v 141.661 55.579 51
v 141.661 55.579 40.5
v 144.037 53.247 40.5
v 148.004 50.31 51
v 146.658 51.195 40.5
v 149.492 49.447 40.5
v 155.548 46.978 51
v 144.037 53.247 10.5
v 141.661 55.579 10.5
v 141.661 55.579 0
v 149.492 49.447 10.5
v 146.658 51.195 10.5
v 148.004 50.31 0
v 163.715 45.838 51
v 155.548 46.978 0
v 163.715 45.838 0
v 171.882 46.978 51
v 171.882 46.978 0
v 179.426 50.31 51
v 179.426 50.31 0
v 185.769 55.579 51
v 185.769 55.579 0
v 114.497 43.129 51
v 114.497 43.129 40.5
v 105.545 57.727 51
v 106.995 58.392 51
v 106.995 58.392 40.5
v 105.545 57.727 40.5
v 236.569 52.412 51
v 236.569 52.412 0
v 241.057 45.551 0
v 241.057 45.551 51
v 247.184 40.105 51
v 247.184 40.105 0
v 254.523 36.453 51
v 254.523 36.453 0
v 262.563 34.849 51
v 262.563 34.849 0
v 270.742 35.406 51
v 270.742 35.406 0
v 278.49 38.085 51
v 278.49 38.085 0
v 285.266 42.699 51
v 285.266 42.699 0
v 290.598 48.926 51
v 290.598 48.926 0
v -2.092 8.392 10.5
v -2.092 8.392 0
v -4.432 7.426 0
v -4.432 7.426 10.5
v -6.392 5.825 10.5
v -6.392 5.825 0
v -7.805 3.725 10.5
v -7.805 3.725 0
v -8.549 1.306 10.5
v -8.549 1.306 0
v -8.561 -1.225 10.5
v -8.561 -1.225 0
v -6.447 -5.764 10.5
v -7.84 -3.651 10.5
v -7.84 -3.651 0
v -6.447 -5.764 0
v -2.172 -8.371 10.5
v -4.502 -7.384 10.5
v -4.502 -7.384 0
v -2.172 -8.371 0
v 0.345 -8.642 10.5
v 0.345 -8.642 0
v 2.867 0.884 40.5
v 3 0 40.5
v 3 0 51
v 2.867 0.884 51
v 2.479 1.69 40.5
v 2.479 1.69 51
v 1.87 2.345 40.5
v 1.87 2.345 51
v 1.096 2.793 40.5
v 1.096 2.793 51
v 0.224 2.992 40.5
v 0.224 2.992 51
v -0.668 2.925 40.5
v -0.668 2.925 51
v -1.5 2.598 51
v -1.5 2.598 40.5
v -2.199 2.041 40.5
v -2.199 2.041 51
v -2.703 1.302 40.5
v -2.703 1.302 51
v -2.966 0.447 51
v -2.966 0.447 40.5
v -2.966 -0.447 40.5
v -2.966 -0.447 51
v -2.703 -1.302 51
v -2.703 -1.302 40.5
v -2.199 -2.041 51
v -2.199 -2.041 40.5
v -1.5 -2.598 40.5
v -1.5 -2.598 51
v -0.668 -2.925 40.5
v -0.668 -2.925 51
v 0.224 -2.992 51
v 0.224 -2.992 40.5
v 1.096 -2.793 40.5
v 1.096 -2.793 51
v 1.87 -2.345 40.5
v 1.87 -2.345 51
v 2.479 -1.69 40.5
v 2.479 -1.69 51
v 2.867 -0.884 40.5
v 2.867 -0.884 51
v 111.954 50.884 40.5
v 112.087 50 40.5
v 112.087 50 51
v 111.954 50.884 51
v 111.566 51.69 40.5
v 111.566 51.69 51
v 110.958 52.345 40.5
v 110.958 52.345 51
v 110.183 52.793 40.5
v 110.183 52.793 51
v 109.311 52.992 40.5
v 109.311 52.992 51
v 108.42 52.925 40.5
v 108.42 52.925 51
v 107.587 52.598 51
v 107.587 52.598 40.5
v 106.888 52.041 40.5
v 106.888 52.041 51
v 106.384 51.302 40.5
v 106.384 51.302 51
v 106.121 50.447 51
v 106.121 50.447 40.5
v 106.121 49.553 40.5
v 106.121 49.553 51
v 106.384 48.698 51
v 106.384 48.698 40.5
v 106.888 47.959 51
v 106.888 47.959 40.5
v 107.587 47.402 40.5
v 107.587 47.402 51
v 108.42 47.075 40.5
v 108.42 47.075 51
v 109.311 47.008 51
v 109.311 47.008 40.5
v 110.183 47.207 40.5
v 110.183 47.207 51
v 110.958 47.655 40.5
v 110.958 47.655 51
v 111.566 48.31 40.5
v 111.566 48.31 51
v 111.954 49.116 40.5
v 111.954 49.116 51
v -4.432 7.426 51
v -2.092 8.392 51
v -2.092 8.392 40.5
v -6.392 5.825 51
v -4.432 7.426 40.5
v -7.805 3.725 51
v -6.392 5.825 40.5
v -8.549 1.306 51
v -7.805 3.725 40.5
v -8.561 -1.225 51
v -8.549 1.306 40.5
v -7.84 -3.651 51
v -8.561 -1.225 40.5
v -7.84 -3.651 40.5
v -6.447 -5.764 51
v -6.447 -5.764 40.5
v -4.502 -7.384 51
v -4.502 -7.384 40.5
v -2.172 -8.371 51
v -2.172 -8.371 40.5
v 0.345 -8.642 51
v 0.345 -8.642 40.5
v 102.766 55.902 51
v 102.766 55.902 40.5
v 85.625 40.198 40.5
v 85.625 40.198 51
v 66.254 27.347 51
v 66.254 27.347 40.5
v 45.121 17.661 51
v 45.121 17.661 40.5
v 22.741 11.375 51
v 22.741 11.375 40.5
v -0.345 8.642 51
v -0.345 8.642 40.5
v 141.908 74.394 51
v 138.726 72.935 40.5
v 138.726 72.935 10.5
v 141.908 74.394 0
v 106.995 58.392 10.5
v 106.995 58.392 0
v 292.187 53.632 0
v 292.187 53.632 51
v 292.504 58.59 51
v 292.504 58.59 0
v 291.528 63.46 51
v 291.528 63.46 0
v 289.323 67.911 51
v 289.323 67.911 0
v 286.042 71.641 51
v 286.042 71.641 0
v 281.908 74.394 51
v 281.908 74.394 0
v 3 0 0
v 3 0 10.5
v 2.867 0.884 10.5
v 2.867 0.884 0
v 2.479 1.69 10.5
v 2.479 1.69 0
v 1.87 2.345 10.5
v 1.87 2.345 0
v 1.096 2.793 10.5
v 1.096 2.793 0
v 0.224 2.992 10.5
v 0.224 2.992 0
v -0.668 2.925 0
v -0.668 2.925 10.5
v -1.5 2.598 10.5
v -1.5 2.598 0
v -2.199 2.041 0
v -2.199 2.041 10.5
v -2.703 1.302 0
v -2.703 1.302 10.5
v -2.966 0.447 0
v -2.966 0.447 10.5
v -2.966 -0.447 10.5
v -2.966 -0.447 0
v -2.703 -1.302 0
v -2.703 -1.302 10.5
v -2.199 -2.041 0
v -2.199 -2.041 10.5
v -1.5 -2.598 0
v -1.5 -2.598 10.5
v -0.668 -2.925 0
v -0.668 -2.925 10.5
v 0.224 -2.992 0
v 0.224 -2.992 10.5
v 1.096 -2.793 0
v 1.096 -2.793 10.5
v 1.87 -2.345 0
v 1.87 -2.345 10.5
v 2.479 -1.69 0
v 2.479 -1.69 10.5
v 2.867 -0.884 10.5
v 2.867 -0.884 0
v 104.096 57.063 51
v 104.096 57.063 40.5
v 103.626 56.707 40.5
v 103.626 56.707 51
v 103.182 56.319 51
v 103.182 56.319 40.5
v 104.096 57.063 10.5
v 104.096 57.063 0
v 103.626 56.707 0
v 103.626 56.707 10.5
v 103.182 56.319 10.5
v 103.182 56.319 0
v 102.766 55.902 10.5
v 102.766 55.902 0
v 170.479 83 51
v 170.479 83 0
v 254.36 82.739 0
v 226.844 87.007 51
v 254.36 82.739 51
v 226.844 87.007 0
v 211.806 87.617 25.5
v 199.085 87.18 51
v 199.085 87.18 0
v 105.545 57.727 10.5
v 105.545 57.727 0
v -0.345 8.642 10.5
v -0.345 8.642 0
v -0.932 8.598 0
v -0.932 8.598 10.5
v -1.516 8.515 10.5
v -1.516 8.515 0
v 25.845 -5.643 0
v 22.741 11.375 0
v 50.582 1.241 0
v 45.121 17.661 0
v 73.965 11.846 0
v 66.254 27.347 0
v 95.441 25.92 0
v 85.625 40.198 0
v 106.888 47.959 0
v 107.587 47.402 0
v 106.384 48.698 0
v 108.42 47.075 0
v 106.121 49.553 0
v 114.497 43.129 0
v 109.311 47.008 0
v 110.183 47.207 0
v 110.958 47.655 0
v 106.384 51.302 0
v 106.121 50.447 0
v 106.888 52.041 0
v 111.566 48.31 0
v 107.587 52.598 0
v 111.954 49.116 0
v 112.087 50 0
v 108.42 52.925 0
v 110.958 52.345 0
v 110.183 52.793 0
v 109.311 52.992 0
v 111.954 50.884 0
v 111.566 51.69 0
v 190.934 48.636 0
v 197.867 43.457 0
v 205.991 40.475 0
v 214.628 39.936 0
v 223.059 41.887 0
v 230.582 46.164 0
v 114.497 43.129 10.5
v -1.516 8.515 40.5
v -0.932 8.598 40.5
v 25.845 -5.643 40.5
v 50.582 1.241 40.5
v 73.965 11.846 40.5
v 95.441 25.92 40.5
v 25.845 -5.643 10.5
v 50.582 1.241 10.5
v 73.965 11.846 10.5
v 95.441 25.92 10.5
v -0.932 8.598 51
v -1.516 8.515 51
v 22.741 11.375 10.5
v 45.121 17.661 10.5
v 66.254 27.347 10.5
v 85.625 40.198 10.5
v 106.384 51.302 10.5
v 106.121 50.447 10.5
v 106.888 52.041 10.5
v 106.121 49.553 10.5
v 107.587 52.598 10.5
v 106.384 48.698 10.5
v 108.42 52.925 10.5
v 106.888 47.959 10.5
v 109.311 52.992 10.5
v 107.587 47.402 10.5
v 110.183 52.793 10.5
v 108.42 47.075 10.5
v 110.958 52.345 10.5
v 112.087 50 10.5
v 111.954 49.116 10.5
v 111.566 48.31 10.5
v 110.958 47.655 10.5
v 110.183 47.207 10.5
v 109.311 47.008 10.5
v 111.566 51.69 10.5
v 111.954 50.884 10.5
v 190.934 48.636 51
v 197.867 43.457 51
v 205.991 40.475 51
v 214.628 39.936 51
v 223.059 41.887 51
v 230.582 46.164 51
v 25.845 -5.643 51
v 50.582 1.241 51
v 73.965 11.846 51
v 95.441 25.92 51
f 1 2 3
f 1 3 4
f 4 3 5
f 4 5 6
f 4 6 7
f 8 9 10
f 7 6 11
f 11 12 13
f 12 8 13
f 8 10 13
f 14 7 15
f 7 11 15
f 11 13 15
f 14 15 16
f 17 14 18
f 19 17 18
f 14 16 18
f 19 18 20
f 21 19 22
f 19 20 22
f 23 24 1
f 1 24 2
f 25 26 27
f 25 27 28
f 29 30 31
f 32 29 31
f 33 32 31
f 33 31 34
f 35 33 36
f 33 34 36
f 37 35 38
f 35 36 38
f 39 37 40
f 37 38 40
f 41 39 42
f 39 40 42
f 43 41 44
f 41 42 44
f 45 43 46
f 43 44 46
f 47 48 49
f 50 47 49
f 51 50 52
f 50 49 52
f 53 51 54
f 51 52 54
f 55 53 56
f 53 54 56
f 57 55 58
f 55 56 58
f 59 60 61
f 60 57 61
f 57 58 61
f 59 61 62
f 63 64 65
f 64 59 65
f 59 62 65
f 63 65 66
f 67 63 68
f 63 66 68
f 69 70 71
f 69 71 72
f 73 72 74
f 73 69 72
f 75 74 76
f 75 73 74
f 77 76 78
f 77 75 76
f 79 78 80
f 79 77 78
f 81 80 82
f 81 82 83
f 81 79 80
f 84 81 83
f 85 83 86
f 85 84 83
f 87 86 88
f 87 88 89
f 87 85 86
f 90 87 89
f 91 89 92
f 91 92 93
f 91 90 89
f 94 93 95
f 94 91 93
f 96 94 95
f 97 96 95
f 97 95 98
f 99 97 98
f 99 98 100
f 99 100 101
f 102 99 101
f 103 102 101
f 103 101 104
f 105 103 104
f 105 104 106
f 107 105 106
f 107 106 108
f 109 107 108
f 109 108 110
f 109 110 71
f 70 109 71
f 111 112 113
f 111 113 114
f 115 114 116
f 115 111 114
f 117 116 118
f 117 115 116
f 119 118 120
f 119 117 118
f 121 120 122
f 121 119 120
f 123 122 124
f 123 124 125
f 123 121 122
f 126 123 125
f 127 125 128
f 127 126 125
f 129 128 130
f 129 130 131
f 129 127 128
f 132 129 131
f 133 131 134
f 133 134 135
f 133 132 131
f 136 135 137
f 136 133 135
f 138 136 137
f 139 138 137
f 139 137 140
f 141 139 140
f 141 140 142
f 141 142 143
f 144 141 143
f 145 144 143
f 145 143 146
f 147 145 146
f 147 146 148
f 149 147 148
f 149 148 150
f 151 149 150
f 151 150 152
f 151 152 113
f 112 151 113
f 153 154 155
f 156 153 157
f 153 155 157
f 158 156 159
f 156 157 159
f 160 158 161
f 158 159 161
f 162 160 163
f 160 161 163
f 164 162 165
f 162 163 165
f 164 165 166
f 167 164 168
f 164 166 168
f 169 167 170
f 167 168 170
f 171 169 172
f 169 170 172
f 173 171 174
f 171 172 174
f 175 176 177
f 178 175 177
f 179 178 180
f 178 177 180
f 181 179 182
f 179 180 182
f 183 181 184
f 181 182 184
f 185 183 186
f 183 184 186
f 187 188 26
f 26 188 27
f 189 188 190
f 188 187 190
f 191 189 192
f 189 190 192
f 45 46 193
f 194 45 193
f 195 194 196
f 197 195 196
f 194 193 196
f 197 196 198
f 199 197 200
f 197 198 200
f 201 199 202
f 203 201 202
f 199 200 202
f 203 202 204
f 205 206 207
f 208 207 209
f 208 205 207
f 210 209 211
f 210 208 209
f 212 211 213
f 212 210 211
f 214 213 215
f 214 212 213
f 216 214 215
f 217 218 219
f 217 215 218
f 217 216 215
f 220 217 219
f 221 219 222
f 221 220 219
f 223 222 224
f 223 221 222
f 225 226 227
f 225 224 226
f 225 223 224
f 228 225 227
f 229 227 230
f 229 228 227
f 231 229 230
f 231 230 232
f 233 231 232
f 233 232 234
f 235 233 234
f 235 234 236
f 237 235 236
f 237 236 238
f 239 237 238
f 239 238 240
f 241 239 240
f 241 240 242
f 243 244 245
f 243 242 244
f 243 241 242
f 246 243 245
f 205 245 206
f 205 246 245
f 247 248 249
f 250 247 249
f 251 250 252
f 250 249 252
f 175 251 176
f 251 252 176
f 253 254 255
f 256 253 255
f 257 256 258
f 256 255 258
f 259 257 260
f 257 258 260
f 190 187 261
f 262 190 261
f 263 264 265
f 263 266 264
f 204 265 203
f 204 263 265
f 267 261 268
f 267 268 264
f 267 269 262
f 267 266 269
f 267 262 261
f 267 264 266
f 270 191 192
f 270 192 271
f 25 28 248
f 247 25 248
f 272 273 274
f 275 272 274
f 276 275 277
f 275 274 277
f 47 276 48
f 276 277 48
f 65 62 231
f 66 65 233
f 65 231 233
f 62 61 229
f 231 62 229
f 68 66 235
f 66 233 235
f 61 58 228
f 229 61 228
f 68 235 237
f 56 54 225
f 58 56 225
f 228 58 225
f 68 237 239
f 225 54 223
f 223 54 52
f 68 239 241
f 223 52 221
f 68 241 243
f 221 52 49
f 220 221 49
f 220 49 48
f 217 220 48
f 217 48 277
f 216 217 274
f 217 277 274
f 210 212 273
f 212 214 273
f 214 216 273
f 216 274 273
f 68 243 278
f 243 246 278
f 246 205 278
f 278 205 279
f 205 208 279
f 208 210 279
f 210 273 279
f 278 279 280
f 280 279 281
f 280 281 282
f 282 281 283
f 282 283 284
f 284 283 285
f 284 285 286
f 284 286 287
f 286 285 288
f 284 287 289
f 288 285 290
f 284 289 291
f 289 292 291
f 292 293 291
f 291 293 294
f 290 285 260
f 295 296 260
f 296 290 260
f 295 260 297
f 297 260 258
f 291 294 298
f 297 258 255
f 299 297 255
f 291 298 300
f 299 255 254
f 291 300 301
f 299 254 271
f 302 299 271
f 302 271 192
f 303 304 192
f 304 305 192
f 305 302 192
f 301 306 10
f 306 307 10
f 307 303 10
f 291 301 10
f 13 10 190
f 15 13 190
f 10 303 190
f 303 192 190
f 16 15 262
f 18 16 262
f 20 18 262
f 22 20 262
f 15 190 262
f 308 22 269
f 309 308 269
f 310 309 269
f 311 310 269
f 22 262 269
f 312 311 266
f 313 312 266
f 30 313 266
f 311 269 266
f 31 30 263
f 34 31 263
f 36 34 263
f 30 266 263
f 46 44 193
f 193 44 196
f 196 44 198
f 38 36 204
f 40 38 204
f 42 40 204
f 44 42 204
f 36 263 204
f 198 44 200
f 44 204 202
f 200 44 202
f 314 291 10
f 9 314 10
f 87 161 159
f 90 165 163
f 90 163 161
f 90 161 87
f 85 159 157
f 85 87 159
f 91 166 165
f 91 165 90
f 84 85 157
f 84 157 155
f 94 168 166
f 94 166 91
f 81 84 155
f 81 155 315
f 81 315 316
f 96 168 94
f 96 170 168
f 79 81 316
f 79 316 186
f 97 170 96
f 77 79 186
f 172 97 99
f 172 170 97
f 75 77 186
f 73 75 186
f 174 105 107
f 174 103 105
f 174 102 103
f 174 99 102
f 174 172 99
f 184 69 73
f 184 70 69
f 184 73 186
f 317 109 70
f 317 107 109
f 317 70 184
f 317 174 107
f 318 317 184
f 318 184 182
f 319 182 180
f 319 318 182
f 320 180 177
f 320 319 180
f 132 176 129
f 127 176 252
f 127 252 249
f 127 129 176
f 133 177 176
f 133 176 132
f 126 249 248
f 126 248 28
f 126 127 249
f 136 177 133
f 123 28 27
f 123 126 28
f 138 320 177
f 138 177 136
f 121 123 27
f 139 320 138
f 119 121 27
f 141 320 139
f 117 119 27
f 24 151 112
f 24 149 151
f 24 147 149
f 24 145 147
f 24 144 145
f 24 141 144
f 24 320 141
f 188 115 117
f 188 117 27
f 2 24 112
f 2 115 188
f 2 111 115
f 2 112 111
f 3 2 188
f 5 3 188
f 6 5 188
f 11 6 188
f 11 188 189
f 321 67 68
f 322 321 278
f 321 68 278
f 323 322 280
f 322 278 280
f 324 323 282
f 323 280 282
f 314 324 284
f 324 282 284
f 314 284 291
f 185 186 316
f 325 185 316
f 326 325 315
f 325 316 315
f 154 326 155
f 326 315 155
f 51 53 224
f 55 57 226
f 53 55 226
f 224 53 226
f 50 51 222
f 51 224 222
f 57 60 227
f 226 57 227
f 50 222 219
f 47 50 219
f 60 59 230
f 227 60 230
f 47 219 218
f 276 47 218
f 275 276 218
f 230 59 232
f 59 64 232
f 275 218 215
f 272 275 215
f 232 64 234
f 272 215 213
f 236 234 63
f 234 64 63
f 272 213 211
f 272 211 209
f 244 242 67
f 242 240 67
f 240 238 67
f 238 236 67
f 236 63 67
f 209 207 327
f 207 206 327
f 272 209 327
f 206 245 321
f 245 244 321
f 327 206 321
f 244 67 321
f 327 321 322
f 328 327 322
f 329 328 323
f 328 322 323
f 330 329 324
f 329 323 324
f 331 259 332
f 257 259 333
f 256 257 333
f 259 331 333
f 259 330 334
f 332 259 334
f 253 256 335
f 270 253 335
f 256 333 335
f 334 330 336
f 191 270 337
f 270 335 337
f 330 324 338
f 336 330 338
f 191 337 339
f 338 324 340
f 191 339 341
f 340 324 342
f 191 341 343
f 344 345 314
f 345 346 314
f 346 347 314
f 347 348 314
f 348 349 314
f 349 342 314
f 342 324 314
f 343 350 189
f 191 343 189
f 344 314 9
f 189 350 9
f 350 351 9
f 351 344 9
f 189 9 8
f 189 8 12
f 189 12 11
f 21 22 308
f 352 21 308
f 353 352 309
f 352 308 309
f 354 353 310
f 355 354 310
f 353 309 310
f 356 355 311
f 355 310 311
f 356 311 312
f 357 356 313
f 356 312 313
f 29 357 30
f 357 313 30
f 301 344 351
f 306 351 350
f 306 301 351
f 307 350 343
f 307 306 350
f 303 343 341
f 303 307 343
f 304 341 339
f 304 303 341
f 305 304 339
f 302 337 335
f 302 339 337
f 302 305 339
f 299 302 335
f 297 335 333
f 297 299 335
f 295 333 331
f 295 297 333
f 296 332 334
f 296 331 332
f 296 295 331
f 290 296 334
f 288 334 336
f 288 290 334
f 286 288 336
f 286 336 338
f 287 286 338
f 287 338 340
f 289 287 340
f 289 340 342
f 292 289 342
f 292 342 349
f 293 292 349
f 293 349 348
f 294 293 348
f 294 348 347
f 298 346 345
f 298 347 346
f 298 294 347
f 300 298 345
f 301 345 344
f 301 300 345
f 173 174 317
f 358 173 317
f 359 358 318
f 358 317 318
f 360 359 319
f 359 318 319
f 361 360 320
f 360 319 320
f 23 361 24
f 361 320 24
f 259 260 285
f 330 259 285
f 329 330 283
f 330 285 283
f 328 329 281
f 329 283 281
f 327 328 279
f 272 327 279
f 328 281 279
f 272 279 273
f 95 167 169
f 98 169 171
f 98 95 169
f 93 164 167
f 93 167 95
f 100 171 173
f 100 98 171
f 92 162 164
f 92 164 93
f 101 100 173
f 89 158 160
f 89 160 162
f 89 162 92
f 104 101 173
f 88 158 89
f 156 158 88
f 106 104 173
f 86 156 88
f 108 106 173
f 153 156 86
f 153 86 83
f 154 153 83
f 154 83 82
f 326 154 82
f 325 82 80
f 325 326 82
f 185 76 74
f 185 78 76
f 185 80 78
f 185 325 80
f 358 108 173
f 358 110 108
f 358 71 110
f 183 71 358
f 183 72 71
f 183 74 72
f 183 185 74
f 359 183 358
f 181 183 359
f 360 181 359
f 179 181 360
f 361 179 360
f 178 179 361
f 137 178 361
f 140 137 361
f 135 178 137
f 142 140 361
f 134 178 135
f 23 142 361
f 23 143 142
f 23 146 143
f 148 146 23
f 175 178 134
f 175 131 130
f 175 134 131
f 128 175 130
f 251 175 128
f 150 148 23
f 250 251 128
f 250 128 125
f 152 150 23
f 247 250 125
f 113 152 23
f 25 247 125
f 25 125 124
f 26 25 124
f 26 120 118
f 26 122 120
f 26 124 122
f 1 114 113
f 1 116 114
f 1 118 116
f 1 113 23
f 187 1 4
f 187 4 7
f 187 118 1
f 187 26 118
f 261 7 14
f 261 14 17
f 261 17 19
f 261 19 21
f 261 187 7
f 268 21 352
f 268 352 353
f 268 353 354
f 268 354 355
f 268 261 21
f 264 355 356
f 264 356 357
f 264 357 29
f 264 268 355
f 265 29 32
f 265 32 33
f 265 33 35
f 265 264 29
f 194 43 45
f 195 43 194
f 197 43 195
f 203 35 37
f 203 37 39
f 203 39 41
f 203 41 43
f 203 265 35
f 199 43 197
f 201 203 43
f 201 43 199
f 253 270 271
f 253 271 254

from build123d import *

# Parameters (mm, degrees)
CROQUIS1_R                 = 3
SALIENTE_EXTRUIR1_DEPTH    = 51
CORTAR_EXTRUIR1_DEPTH      = 311.888957589
CORTAR_EXTRUIR1_DEPTH_BACK = 311.888957589
CROQUIS2_W                 = 330
CROQUIS2_H                 = 30


with BuildPart() as part:
    # Croquis1 → Saliente-Extruir1 (new body)
    # profile 1 of 4: a face of its own
    with BuildSketch(Plane.XY):
        with BuildLine():
            Line((141.907724078, 74.393898239), (106.994802629, 58.391586929))
            ThreePointArc((106.994802629, 58.391586929), (116.540266028, 54.387158459), (115.408572004, 44.097815064))
            ThreePointArc((115.408572004, 44.097815064), (114.953536771, 43.612404014), (114.496565447, 43.128815181))
            Line((114.496565447, 43.128815181), (141.660745717, 55.579496794))
            ThreePointArc((141.660745717, 55.579496794), (163.715018222, 45.838294791), (185.769290727, 55.579496794))
            ThreePointArc((185.769290727, 55.579496794), (210.289811625, 39.891989826), (236.56917478, 52.411929606))
            ThreePointArc((236.56917478, 52.411929606), (262.563049751, 34.849044969), (290.598242925, 48.926132611))
            ThreePointArc((290.598242925, 48.926132611), (291.527530464, 63.45988081), (281.907724078, 74.393898239))
            add(Edge.make_bspline(
                [(141.907724078, 74.393898239), (211.705167047, 100.839206128), (281.907724078, 74.393898239)],
                knots=[0, 0, 0, 1, 1, 1], degree=2))
        make_face()
    # profile 2 of 4: a face of its own
    with BuildSketch(Plane.XY):
        with BuildLine():
            ThreePointArc((105.545350362, 57.727231572), (116.814352718, 53.541770784), (112.62889193, 42.272768428))
            Line((112.62889193, 42.272768428), (114.496565447, 43.128815181))
            ThreePointArc((114.496565447, 43.128815181), (114.953536771, 43.612404014), (115.408572004, 44.097815064))
            ThreePointArc((115.408572004, 44.097815064), (116.540266028, 54.387158459), (106.994802629, 58.391586929))
            Line((106.994802629, 58.391586929), (105.545350362, 57.727231572))
        make_face()
    # profile 3 of 4: a face of its own
    with BuildSketch(Plane.XY):
        with BuildLine():
            Line((-2.092318518, 8.391586929), (-3.541770784, 7.727231572))
            ThreePointArc((-3.541770784, 7.727231572), (-7.727231572, -3.541770784), (3.541770784, -7.727231572))
            Line((3.541770784, -7.727231572), (112.62889193, 42.272768428))
            ThreePointArc((112.62889193, 42.272768428), (116.814352718, 53.541770784), (105.545350362, 57.727231572))
            Line((105.545350362, 57.727231572), (104.095898096, 57.062876215))
            ThreePointArc((104.095898096, 57.062876215), (103.401090123, 56.516561913), (102.765670289, 55.902184936))
            ThreePointArc((102.765670289, 55.902184936), (55.876581472, 22.091691755), (-0.344694323, 8.641626802))
            ThreePointArc((-0.344694323, 8.641626802), (-1.224903213, 8.561316493), (-2.092318518, 8.391586929))
        make_face()
        Circle(CROQUIS1_R, mode=Mode.SUBTRACT)
        with Locations((109.087121146, 50)):
            Circle(CROQUIS1_R, mode=Mode.SUBTRACT)
    # profile 4 of 4: a face of its own
    with BuildSketch(Plane.XY):
        with BuildLine():
            ThreePointArc((3.541770784, -7.727231572), (-7.727231572, -3.541770784), (-3.541770784, 7.727231572))
            Line((-3.541770784, 7.727231572), (-2.092318518, 8.391586929))
            ThreePointArc((-2.092318518, 8.391586929), (-8.561316493, -1.224903213), (0.344694323, -8.641626802))
            ThreePointArc((0.344694323, -8.641626802), (62.478274911, 6.091677747), (114.496565447, 43.128815181))
            Line((114.496565447, 43.128815181), (112.62889193, 42.272768428))
            Line((112.62889193, 42.272768428), (3.541770784, -7.727231572))
        make_face()
    extrude(amount=SALIENTE_EXTRUIR1_DEPTH)

    # Croquis2 → Cortar-Extruir1 (cut, two sides: drawn at the far end of the back side and taken through both)
    with BuildSketch(Plane(origin=(-3.541770784, 7.727231572, 0), x_dir=(0.9090593428863096, 0.4166666666666667, 0), z_dir=(-0.41666666666666663, 0.9090593428863095, 0)).offset(-CORTAR_EXTRUIR1_DEPTH_BACK)):
        with Locations((-8.500249882, -25.5)):
            Rectangle(CROQUIS2_W, CROQUIS2_H)
    extrude(amount=CORTAR_EXTRUIR1_DEPTH + CORTAR_EXTRUIR1_DEPTH_BACK, mode=Mode.SUBTRACT)


solid = part.part
